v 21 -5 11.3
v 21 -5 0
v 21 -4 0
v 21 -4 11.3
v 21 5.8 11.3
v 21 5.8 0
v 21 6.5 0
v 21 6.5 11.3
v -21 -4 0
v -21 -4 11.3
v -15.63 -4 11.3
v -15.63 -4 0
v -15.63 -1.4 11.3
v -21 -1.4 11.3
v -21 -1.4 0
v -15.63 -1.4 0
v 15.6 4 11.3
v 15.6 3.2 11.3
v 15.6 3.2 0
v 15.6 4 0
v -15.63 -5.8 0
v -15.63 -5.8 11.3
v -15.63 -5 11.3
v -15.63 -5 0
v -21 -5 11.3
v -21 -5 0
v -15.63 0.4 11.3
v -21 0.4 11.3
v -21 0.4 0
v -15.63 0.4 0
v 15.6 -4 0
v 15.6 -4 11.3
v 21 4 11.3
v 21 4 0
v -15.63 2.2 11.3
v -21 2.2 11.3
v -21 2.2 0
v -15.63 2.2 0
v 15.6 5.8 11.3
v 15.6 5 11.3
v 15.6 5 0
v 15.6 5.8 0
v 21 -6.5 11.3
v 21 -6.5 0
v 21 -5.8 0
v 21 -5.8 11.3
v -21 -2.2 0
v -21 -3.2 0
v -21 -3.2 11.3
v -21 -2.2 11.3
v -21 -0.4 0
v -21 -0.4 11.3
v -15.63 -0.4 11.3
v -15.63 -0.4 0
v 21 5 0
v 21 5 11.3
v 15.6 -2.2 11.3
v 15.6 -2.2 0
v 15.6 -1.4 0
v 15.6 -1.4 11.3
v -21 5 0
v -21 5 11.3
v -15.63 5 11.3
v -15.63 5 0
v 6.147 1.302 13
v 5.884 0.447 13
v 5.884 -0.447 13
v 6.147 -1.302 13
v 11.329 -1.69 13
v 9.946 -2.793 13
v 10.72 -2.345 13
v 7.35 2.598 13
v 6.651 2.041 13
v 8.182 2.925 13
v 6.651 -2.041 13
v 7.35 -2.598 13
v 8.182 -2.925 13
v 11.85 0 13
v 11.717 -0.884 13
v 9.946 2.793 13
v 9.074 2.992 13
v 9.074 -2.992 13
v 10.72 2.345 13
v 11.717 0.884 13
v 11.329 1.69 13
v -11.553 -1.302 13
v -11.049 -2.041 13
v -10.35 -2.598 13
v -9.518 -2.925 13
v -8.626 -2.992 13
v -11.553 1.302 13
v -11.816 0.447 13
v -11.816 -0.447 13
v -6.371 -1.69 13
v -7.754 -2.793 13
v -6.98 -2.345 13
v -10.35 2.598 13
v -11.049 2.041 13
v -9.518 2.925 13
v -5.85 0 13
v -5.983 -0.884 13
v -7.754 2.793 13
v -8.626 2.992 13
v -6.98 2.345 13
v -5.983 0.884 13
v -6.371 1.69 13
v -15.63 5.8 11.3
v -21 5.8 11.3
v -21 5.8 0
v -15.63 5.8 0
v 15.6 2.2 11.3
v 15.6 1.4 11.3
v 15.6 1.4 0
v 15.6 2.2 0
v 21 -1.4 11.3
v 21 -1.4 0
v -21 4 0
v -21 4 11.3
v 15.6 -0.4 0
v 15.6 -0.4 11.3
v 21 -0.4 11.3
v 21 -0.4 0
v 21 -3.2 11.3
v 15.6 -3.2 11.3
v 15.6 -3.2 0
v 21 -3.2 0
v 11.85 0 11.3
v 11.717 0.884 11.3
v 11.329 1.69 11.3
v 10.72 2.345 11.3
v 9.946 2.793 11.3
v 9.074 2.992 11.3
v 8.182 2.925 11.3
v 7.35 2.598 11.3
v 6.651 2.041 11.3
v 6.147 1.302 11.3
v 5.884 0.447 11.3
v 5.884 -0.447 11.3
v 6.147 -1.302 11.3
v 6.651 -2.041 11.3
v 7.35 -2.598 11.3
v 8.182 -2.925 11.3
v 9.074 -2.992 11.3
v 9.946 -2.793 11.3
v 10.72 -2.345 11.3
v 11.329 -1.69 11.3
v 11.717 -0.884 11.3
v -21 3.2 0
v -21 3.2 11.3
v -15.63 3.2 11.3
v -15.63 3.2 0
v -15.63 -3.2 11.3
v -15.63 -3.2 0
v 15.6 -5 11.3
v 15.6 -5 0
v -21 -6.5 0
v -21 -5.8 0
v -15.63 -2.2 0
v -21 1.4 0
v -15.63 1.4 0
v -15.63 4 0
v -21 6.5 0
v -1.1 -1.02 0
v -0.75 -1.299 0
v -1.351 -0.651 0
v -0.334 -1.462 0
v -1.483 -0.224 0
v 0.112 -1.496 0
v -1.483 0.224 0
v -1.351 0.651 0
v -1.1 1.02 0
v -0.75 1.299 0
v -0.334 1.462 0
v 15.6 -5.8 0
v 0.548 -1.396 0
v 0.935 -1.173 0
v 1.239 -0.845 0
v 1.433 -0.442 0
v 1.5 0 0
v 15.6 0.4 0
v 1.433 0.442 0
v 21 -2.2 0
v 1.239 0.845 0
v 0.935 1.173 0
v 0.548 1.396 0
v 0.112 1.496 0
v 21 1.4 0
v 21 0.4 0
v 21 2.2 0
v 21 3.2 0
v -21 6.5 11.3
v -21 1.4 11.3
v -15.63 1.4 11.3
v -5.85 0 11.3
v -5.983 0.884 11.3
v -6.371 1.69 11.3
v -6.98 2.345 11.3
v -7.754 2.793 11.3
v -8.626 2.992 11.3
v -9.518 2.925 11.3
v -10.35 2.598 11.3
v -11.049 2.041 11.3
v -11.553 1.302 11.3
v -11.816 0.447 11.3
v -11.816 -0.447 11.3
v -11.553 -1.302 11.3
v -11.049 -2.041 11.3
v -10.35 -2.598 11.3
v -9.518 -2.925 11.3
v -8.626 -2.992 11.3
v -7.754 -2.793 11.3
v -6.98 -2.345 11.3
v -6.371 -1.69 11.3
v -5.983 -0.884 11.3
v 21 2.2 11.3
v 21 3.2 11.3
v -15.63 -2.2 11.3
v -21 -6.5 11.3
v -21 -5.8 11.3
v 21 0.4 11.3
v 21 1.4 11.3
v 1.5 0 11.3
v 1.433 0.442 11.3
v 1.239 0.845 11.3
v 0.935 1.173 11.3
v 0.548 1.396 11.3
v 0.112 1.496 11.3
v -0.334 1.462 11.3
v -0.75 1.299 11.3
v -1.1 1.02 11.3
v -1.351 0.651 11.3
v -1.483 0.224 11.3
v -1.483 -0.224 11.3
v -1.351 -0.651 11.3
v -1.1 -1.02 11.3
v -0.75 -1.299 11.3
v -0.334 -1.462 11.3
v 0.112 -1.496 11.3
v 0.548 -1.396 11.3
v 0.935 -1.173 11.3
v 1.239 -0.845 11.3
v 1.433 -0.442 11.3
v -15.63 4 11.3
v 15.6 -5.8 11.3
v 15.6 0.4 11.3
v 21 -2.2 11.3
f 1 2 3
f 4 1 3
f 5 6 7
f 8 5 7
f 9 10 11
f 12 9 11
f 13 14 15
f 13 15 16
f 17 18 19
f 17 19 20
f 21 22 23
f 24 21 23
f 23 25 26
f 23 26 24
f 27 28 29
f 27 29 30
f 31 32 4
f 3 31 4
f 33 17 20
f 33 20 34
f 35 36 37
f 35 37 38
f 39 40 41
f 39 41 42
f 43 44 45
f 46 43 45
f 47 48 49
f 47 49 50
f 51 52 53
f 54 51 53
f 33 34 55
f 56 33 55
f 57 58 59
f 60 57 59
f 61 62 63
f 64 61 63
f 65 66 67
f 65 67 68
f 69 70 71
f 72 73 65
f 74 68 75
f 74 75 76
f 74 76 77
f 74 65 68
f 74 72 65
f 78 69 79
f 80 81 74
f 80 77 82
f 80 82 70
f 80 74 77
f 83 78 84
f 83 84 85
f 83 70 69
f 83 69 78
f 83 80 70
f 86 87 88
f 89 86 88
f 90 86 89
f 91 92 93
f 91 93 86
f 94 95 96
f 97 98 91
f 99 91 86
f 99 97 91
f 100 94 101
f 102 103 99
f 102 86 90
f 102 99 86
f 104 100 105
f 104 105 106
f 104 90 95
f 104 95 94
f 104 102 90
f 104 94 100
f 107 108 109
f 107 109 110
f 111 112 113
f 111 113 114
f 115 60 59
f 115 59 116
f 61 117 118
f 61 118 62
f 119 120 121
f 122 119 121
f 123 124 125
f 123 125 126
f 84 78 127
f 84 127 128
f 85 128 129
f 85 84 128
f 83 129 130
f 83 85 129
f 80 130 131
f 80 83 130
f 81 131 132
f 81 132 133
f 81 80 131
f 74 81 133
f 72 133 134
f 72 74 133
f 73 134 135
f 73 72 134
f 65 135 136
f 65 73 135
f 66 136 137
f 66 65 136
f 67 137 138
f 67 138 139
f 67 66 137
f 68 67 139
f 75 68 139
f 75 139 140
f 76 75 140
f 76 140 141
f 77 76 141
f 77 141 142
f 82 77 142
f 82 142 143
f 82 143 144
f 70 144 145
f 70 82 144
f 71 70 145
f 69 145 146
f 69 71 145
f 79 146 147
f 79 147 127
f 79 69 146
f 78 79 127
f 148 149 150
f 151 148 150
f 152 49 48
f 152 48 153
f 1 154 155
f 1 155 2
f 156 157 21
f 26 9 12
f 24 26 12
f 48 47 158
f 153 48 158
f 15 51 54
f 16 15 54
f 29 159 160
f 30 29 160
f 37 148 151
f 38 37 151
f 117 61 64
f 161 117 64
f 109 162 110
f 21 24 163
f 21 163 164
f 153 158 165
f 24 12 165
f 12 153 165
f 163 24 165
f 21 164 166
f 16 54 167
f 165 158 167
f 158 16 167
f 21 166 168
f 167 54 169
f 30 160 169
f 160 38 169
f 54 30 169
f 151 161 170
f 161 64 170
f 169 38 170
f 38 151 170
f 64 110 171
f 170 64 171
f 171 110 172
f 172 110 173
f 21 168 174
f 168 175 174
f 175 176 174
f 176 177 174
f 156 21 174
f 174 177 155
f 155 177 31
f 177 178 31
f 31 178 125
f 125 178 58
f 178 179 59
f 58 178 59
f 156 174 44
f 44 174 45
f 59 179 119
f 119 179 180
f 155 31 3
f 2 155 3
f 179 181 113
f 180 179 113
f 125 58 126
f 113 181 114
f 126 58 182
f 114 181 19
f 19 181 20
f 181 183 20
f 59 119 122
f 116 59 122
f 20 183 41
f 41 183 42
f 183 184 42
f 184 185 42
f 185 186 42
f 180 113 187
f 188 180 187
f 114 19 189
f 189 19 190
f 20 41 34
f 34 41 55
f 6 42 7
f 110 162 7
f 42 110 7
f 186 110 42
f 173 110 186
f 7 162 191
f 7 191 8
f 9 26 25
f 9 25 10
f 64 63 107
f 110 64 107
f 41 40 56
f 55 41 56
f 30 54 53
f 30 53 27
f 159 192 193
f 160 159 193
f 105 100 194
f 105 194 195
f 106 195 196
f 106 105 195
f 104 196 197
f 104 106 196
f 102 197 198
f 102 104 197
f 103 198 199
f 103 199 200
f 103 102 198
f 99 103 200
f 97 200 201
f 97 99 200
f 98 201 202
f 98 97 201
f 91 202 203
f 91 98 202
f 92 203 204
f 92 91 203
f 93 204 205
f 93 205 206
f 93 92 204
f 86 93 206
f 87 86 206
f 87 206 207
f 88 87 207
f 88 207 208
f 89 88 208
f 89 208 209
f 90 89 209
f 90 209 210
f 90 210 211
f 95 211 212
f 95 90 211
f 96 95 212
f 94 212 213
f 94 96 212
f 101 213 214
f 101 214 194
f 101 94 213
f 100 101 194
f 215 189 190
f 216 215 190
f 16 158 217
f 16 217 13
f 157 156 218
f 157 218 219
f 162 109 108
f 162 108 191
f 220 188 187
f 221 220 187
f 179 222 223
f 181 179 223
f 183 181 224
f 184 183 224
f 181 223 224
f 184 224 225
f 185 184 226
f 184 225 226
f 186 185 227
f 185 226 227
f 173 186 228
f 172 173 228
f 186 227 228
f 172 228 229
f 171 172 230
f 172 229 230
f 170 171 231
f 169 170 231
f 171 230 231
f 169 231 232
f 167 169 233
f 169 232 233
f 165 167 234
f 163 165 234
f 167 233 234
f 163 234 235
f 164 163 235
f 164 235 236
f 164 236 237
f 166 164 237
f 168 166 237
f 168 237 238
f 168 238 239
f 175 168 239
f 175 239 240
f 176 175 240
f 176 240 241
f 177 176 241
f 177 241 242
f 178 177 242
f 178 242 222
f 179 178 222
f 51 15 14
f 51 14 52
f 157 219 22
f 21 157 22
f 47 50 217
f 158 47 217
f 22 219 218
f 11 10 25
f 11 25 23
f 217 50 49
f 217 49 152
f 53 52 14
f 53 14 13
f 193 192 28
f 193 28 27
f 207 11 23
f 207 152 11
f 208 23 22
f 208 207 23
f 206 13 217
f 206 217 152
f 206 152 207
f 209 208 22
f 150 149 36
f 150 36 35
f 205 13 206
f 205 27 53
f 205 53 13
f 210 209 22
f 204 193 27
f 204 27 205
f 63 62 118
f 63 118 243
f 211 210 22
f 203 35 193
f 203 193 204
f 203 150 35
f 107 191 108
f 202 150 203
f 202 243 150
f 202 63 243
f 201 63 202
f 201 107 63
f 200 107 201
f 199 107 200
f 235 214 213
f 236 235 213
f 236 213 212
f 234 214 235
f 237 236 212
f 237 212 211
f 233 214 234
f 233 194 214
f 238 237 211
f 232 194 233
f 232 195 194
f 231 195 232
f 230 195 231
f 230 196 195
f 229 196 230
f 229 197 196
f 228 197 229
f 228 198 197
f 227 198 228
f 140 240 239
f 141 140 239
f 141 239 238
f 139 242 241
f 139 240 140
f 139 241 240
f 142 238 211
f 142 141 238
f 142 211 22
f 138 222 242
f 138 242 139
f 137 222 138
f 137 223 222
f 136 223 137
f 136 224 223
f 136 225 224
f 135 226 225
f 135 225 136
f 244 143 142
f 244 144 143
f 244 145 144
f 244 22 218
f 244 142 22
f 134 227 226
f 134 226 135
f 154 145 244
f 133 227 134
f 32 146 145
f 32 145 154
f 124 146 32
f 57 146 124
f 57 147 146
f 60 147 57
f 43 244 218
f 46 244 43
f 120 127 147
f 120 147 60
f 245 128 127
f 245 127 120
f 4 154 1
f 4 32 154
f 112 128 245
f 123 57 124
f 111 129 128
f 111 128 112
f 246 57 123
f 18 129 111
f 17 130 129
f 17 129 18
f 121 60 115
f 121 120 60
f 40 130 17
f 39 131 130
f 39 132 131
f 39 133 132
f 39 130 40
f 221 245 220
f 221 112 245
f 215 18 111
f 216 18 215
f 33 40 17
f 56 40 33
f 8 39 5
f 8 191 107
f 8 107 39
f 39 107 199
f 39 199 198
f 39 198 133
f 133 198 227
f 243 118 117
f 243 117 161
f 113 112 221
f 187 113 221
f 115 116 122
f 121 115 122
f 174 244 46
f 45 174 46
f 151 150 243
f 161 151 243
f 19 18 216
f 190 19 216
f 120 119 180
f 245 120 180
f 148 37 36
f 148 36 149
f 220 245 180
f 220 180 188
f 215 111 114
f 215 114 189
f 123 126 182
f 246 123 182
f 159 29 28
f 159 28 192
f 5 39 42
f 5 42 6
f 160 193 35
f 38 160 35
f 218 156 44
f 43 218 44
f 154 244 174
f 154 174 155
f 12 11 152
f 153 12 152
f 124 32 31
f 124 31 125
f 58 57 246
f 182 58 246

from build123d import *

# Parameters (mm, degrees)
F0_W     = 42
F0_H     = 13
F1_DEPTH = 13
F2_W     = 42
F2_H     = 13
F2_R     = 3
F3_DEPTH = 1.7
F4_W     = 5.5
F4_H     = 0.8
F5_DEPTH = 11.301
F7_R     = 1.5
F8_DEPTH = 11.301


with BuildPart() as f1:
    # F0 (on Top) → F1 (new body)
    with BuildSketch(Plane.XY):
        Rectangle(F0_W, F0_H)
    extrude(amount=F1_DEPTH)

    # F2 (on face) → F3 (cut)
    with BuildSketch(Plane.XY.offset(13)):
        Rectangle(F2_W, F2_H)
        with Locations((-8.85, 0)):
            Circle(F2_R, mode=Mode.SUBTRACT)
        with Locations((8.85, 0)):
            Circle(F2_R, mode=Mode.SUBTRACT)
    extrude(amount=-F3_DEPTH, mode=Mode.SUBTRACT)

    # F4 (on face) → F5 (cut, through all)
    with BuildSketch(Plane.XY.offset(11.3)):
        with Locations((18.35, 5.4)):
            Rectangle(F4_W, F4_H)
        with Locations((18.35, 3.6)):
            Rectangle(F4_W, F4_H)
        with Locations((18.35, 1.8)):
            Rectangle(F4_W, F4_H)
        with Locations((18.35, 0)):
            Rectangle(F4_W, F4_H)
        with Locations((18.35, -1.8)):
            Rectangle(F4_W, F4_H)
        with Locations((18.35, -3.6)):
            Rectangle(F4_W, F4_H)
        with Locations((18.35, -5.4)):
            Rectangle(F4_W, F4_H)
        with Locations((-18.380066, 5.4)):
            Rectangle(F4_W, F4_H)
        with Locations((-18.380066, 3.6)):
            Rectangle(F4_W, F4_H)
        with Locations((-18.380066, 1.8)):
            Rectangle(F4_W, F4_H)
        with Locations((-18.380066, 0)):
            Rectangle(F4_W, F4_H)
        with Locations((-18.380066, -1.8)):
            Rectangle(F4_W, F4_H)
        with Locations((-18.380066, -3.6)):
            Rectangle(F4_W, F4_H)
        with Locations((-18.380066, -5.4)):
            Rectangle(F4_W, F4_H)
    extrude(amount=-F5_DEPTH, mode=Mode.SUBTRACT)

    # F7 (on face) → F8 (cut, through all)
    with BuildSketch(Plane.XY.offset(11.3)):
        Circle(F7_R)
    extrude(amount=-F8_DEPTH, mode=Mode.SUBTRACT)


solid = f1.part
